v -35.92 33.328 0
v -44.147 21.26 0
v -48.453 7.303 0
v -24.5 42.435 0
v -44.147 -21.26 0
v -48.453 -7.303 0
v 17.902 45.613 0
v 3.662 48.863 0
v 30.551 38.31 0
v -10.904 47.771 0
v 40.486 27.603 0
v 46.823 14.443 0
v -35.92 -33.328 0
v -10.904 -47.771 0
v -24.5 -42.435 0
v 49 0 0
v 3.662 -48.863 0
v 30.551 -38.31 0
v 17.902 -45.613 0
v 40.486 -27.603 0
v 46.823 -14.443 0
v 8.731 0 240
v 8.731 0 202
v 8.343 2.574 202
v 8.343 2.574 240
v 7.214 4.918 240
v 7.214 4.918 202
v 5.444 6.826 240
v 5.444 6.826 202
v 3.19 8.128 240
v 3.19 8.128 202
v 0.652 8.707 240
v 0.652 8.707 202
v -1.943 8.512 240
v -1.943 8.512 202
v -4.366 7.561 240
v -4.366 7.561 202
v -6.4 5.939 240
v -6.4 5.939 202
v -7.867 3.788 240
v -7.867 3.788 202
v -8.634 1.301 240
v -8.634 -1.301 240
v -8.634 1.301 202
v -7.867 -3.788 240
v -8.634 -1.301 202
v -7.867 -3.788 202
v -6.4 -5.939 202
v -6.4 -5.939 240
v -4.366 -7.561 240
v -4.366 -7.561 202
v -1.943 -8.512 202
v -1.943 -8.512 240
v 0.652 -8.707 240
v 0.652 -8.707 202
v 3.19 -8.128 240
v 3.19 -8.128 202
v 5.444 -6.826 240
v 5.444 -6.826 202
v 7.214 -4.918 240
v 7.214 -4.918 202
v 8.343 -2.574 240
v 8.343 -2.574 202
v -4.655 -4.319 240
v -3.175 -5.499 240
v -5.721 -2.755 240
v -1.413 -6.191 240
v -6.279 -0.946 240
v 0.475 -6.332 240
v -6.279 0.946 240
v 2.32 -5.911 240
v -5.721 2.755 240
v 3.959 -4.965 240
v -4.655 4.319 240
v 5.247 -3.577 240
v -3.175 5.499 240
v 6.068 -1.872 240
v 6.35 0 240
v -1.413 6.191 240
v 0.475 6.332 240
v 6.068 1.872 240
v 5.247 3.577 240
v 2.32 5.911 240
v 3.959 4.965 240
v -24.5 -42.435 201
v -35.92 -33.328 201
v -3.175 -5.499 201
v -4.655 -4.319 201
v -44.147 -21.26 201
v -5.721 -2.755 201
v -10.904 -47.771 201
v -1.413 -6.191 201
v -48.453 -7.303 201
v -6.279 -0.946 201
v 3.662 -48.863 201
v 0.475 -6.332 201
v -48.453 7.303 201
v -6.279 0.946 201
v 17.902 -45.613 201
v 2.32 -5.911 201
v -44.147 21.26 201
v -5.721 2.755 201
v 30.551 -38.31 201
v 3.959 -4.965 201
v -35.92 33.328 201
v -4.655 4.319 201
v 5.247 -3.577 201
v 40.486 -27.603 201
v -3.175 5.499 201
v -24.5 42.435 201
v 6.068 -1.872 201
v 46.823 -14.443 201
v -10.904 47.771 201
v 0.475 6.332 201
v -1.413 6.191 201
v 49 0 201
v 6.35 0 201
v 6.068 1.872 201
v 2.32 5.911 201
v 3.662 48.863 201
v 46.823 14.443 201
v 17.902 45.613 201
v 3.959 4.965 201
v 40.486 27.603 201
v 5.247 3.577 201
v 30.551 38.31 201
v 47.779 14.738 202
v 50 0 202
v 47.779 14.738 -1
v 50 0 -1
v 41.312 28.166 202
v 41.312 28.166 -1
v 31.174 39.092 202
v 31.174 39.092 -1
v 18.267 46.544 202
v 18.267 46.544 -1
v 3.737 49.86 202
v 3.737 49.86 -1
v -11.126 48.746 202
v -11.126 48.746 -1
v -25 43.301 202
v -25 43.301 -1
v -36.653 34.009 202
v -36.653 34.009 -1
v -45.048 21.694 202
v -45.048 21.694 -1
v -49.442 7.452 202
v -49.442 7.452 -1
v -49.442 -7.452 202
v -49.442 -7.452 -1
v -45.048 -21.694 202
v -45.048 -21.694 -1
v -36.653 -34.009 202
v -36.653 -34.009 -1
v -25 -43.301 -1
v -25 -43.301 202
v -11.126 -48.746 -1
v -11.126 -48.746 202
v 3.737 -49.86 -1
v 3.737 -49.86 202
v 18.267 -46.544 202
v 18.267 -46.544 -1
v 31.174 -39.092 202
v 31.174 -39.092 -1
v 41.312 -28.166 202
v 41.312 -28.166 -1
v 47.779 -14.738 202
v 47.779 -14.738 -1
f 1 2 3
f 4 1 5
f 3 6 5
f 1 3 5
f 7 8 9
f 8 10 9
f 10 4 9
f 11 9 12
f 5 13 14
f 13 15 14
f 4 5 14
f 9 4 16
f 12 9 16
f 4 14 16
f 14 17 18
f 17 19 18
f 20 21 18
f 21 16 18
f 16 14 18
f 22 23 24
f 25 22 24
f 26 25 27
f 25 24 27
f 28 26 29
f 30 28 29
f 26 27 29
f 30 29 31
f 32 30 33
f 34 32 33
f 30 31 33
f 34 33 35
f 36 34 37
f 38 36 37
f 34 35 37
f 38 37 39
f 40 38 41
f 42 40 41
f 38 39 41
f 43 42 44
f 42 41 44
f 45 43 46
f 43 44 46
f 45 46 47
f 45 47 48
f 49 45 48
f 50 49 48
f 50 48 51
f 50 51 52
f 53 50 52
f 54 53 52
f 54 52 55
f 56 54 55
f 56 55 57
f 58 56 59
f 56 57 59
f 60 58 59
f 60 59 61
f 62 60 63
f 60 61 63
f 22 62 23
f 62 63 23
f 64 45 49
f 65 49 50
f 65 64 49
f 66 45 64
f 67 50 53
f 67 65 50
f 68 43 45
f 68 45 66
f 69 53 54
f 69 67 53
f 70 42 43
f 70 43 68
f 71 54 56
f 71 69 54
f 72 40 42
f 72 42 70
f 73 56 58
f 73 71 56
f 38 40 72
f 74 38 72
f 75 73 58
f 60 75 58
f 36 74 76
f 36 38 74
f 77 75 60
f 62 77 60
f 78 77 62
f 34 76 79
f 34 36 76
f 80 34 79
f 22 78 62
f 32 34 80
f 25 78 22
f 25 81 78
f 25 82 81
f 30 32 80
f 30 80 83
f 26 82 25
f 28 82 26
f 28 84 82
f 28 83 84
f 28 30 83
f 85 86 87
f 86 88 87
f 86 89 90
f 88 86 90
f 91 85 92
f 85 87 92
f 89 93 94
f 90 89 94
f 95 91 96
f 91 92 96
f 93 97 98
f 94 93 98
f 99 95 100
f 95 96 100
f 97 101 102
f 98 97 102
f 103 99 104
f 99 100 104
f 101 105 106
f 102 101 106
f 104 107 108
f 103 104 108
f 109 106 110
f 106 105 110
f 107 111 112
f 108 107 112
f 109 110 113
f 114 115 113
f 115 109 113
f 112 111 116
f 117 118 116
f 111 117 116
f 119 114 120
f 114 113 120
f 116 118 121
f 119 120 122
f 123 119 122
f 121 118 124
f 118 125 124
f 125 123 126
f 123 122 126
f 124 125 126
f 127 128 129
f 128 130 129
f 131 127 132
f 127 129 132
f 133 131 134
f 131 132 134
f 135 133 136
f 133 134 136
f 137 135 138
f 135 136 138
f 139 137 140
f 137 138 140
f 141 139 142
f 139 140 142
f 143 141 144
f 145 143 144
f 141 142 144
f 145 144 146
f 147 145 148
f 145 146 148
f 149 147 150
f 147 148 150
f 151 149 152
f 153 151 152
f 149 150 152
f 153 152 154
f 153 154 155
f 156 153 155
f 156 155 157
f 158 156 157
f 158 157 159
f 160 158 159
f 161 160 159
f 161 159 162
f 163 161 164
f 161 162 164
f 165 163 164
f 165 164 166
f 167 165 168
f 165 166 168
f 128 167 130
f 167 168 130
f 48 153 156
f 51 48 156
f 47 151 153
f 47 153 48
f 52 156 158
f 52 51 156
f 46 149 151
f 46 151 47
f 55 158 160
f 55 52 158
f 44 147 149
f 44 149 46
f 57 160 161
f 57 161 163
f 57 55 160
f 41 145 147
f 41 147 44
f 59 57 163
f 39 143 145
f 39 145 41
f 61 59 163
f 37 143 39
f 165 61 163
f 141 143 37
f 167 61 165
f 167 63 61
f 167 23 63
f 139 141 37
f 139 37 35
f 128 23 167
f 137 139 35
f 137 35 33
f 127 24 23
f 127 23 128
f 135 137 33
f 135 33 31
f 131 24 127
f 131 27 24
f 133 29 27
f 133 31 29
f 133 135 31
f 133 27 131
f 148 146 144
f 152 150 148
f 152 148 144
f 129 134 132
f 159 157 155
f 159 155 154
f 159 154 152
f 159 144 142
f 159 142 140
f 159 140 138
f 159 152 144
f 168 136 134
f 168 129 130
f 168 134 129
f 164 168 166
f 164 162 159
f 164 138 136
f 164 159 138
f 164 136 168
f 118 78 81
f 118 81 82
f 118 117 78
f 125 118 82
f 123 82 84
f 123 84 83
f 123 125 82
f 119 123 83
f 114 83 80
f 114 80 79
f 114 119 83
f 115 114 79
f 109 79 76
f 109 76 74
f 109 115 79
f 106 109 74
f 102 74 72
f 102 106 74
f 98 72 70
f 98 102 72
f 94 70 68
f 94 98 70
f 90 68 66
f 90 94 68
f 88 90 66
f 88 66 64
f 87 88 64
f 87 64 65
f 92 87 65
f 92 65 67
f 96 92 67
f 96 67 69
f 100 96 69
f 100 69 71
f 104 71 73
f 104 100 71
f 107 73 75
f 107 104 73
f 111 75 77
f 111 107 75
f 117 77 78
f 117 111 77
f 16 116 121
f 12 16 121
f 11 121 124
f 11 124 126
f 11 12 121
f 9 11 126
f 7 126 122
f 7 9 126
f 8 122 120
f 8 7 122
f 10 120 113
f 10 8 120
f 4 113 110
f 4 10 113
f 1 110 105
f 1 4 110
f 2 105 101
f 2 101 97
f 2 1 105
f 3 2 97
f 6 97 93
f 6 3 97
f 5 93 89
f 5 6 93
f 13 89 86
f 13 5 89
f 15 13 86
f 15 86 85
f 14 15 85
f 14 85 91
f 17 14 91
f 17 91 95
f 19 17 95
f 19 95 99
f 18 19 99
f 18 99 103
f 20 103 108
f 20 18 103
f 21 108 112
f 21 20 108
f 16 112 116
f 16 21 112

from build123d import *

# Parameters (mm, degrees)
F0_R     = 50
F0_R_2   = 49
F1_DEPTH = 201
F2_R     = 50
F3_DEPTH = 1
F5_R     = 50
F5_R_2   = 6.35
F6_DEPTH = 1
F8_R     = 8.73125
F8_R_2   = 6.35
F9_DEPTH = 38


with BuildPart() as f1:
    # F0 (on Top) → F1 (new body)
    with BuildSketch(Plane.XY):
        Circle(F0_R)
        Circle(F0_R_2, mode=Mode.SUBTRACT)
    extrude(amount=F1_DEPTH)

    # F2 (on face) → F3 (join)
    with BuildSketch(Plane(origin=(0, 0, 0), x_dir=(1, 0, 0), z_dir=(0, 0, -1))):
        Circle(F2_R)
    extrude(amount=F3_DEPTH)

    # F5 (on offset) → F6 (join)
    with BuildSketch(Plane.XY.offset(201)):
        Circle(F5_R)
        Circle(F5_R_2, mode=Mode.SUBTRACT)
    extrude(amount=F6_DEPTH)

    # F8 (on offset) → F9 (join)
    with BuildSketch(Plane.XY.offset(202)):
        Circle(F8_R)
        Circle(F8_R_2, mode=Mode.SUBTRACT)
    extrude(amount=F9_DEPTH)


solid = f1.part
